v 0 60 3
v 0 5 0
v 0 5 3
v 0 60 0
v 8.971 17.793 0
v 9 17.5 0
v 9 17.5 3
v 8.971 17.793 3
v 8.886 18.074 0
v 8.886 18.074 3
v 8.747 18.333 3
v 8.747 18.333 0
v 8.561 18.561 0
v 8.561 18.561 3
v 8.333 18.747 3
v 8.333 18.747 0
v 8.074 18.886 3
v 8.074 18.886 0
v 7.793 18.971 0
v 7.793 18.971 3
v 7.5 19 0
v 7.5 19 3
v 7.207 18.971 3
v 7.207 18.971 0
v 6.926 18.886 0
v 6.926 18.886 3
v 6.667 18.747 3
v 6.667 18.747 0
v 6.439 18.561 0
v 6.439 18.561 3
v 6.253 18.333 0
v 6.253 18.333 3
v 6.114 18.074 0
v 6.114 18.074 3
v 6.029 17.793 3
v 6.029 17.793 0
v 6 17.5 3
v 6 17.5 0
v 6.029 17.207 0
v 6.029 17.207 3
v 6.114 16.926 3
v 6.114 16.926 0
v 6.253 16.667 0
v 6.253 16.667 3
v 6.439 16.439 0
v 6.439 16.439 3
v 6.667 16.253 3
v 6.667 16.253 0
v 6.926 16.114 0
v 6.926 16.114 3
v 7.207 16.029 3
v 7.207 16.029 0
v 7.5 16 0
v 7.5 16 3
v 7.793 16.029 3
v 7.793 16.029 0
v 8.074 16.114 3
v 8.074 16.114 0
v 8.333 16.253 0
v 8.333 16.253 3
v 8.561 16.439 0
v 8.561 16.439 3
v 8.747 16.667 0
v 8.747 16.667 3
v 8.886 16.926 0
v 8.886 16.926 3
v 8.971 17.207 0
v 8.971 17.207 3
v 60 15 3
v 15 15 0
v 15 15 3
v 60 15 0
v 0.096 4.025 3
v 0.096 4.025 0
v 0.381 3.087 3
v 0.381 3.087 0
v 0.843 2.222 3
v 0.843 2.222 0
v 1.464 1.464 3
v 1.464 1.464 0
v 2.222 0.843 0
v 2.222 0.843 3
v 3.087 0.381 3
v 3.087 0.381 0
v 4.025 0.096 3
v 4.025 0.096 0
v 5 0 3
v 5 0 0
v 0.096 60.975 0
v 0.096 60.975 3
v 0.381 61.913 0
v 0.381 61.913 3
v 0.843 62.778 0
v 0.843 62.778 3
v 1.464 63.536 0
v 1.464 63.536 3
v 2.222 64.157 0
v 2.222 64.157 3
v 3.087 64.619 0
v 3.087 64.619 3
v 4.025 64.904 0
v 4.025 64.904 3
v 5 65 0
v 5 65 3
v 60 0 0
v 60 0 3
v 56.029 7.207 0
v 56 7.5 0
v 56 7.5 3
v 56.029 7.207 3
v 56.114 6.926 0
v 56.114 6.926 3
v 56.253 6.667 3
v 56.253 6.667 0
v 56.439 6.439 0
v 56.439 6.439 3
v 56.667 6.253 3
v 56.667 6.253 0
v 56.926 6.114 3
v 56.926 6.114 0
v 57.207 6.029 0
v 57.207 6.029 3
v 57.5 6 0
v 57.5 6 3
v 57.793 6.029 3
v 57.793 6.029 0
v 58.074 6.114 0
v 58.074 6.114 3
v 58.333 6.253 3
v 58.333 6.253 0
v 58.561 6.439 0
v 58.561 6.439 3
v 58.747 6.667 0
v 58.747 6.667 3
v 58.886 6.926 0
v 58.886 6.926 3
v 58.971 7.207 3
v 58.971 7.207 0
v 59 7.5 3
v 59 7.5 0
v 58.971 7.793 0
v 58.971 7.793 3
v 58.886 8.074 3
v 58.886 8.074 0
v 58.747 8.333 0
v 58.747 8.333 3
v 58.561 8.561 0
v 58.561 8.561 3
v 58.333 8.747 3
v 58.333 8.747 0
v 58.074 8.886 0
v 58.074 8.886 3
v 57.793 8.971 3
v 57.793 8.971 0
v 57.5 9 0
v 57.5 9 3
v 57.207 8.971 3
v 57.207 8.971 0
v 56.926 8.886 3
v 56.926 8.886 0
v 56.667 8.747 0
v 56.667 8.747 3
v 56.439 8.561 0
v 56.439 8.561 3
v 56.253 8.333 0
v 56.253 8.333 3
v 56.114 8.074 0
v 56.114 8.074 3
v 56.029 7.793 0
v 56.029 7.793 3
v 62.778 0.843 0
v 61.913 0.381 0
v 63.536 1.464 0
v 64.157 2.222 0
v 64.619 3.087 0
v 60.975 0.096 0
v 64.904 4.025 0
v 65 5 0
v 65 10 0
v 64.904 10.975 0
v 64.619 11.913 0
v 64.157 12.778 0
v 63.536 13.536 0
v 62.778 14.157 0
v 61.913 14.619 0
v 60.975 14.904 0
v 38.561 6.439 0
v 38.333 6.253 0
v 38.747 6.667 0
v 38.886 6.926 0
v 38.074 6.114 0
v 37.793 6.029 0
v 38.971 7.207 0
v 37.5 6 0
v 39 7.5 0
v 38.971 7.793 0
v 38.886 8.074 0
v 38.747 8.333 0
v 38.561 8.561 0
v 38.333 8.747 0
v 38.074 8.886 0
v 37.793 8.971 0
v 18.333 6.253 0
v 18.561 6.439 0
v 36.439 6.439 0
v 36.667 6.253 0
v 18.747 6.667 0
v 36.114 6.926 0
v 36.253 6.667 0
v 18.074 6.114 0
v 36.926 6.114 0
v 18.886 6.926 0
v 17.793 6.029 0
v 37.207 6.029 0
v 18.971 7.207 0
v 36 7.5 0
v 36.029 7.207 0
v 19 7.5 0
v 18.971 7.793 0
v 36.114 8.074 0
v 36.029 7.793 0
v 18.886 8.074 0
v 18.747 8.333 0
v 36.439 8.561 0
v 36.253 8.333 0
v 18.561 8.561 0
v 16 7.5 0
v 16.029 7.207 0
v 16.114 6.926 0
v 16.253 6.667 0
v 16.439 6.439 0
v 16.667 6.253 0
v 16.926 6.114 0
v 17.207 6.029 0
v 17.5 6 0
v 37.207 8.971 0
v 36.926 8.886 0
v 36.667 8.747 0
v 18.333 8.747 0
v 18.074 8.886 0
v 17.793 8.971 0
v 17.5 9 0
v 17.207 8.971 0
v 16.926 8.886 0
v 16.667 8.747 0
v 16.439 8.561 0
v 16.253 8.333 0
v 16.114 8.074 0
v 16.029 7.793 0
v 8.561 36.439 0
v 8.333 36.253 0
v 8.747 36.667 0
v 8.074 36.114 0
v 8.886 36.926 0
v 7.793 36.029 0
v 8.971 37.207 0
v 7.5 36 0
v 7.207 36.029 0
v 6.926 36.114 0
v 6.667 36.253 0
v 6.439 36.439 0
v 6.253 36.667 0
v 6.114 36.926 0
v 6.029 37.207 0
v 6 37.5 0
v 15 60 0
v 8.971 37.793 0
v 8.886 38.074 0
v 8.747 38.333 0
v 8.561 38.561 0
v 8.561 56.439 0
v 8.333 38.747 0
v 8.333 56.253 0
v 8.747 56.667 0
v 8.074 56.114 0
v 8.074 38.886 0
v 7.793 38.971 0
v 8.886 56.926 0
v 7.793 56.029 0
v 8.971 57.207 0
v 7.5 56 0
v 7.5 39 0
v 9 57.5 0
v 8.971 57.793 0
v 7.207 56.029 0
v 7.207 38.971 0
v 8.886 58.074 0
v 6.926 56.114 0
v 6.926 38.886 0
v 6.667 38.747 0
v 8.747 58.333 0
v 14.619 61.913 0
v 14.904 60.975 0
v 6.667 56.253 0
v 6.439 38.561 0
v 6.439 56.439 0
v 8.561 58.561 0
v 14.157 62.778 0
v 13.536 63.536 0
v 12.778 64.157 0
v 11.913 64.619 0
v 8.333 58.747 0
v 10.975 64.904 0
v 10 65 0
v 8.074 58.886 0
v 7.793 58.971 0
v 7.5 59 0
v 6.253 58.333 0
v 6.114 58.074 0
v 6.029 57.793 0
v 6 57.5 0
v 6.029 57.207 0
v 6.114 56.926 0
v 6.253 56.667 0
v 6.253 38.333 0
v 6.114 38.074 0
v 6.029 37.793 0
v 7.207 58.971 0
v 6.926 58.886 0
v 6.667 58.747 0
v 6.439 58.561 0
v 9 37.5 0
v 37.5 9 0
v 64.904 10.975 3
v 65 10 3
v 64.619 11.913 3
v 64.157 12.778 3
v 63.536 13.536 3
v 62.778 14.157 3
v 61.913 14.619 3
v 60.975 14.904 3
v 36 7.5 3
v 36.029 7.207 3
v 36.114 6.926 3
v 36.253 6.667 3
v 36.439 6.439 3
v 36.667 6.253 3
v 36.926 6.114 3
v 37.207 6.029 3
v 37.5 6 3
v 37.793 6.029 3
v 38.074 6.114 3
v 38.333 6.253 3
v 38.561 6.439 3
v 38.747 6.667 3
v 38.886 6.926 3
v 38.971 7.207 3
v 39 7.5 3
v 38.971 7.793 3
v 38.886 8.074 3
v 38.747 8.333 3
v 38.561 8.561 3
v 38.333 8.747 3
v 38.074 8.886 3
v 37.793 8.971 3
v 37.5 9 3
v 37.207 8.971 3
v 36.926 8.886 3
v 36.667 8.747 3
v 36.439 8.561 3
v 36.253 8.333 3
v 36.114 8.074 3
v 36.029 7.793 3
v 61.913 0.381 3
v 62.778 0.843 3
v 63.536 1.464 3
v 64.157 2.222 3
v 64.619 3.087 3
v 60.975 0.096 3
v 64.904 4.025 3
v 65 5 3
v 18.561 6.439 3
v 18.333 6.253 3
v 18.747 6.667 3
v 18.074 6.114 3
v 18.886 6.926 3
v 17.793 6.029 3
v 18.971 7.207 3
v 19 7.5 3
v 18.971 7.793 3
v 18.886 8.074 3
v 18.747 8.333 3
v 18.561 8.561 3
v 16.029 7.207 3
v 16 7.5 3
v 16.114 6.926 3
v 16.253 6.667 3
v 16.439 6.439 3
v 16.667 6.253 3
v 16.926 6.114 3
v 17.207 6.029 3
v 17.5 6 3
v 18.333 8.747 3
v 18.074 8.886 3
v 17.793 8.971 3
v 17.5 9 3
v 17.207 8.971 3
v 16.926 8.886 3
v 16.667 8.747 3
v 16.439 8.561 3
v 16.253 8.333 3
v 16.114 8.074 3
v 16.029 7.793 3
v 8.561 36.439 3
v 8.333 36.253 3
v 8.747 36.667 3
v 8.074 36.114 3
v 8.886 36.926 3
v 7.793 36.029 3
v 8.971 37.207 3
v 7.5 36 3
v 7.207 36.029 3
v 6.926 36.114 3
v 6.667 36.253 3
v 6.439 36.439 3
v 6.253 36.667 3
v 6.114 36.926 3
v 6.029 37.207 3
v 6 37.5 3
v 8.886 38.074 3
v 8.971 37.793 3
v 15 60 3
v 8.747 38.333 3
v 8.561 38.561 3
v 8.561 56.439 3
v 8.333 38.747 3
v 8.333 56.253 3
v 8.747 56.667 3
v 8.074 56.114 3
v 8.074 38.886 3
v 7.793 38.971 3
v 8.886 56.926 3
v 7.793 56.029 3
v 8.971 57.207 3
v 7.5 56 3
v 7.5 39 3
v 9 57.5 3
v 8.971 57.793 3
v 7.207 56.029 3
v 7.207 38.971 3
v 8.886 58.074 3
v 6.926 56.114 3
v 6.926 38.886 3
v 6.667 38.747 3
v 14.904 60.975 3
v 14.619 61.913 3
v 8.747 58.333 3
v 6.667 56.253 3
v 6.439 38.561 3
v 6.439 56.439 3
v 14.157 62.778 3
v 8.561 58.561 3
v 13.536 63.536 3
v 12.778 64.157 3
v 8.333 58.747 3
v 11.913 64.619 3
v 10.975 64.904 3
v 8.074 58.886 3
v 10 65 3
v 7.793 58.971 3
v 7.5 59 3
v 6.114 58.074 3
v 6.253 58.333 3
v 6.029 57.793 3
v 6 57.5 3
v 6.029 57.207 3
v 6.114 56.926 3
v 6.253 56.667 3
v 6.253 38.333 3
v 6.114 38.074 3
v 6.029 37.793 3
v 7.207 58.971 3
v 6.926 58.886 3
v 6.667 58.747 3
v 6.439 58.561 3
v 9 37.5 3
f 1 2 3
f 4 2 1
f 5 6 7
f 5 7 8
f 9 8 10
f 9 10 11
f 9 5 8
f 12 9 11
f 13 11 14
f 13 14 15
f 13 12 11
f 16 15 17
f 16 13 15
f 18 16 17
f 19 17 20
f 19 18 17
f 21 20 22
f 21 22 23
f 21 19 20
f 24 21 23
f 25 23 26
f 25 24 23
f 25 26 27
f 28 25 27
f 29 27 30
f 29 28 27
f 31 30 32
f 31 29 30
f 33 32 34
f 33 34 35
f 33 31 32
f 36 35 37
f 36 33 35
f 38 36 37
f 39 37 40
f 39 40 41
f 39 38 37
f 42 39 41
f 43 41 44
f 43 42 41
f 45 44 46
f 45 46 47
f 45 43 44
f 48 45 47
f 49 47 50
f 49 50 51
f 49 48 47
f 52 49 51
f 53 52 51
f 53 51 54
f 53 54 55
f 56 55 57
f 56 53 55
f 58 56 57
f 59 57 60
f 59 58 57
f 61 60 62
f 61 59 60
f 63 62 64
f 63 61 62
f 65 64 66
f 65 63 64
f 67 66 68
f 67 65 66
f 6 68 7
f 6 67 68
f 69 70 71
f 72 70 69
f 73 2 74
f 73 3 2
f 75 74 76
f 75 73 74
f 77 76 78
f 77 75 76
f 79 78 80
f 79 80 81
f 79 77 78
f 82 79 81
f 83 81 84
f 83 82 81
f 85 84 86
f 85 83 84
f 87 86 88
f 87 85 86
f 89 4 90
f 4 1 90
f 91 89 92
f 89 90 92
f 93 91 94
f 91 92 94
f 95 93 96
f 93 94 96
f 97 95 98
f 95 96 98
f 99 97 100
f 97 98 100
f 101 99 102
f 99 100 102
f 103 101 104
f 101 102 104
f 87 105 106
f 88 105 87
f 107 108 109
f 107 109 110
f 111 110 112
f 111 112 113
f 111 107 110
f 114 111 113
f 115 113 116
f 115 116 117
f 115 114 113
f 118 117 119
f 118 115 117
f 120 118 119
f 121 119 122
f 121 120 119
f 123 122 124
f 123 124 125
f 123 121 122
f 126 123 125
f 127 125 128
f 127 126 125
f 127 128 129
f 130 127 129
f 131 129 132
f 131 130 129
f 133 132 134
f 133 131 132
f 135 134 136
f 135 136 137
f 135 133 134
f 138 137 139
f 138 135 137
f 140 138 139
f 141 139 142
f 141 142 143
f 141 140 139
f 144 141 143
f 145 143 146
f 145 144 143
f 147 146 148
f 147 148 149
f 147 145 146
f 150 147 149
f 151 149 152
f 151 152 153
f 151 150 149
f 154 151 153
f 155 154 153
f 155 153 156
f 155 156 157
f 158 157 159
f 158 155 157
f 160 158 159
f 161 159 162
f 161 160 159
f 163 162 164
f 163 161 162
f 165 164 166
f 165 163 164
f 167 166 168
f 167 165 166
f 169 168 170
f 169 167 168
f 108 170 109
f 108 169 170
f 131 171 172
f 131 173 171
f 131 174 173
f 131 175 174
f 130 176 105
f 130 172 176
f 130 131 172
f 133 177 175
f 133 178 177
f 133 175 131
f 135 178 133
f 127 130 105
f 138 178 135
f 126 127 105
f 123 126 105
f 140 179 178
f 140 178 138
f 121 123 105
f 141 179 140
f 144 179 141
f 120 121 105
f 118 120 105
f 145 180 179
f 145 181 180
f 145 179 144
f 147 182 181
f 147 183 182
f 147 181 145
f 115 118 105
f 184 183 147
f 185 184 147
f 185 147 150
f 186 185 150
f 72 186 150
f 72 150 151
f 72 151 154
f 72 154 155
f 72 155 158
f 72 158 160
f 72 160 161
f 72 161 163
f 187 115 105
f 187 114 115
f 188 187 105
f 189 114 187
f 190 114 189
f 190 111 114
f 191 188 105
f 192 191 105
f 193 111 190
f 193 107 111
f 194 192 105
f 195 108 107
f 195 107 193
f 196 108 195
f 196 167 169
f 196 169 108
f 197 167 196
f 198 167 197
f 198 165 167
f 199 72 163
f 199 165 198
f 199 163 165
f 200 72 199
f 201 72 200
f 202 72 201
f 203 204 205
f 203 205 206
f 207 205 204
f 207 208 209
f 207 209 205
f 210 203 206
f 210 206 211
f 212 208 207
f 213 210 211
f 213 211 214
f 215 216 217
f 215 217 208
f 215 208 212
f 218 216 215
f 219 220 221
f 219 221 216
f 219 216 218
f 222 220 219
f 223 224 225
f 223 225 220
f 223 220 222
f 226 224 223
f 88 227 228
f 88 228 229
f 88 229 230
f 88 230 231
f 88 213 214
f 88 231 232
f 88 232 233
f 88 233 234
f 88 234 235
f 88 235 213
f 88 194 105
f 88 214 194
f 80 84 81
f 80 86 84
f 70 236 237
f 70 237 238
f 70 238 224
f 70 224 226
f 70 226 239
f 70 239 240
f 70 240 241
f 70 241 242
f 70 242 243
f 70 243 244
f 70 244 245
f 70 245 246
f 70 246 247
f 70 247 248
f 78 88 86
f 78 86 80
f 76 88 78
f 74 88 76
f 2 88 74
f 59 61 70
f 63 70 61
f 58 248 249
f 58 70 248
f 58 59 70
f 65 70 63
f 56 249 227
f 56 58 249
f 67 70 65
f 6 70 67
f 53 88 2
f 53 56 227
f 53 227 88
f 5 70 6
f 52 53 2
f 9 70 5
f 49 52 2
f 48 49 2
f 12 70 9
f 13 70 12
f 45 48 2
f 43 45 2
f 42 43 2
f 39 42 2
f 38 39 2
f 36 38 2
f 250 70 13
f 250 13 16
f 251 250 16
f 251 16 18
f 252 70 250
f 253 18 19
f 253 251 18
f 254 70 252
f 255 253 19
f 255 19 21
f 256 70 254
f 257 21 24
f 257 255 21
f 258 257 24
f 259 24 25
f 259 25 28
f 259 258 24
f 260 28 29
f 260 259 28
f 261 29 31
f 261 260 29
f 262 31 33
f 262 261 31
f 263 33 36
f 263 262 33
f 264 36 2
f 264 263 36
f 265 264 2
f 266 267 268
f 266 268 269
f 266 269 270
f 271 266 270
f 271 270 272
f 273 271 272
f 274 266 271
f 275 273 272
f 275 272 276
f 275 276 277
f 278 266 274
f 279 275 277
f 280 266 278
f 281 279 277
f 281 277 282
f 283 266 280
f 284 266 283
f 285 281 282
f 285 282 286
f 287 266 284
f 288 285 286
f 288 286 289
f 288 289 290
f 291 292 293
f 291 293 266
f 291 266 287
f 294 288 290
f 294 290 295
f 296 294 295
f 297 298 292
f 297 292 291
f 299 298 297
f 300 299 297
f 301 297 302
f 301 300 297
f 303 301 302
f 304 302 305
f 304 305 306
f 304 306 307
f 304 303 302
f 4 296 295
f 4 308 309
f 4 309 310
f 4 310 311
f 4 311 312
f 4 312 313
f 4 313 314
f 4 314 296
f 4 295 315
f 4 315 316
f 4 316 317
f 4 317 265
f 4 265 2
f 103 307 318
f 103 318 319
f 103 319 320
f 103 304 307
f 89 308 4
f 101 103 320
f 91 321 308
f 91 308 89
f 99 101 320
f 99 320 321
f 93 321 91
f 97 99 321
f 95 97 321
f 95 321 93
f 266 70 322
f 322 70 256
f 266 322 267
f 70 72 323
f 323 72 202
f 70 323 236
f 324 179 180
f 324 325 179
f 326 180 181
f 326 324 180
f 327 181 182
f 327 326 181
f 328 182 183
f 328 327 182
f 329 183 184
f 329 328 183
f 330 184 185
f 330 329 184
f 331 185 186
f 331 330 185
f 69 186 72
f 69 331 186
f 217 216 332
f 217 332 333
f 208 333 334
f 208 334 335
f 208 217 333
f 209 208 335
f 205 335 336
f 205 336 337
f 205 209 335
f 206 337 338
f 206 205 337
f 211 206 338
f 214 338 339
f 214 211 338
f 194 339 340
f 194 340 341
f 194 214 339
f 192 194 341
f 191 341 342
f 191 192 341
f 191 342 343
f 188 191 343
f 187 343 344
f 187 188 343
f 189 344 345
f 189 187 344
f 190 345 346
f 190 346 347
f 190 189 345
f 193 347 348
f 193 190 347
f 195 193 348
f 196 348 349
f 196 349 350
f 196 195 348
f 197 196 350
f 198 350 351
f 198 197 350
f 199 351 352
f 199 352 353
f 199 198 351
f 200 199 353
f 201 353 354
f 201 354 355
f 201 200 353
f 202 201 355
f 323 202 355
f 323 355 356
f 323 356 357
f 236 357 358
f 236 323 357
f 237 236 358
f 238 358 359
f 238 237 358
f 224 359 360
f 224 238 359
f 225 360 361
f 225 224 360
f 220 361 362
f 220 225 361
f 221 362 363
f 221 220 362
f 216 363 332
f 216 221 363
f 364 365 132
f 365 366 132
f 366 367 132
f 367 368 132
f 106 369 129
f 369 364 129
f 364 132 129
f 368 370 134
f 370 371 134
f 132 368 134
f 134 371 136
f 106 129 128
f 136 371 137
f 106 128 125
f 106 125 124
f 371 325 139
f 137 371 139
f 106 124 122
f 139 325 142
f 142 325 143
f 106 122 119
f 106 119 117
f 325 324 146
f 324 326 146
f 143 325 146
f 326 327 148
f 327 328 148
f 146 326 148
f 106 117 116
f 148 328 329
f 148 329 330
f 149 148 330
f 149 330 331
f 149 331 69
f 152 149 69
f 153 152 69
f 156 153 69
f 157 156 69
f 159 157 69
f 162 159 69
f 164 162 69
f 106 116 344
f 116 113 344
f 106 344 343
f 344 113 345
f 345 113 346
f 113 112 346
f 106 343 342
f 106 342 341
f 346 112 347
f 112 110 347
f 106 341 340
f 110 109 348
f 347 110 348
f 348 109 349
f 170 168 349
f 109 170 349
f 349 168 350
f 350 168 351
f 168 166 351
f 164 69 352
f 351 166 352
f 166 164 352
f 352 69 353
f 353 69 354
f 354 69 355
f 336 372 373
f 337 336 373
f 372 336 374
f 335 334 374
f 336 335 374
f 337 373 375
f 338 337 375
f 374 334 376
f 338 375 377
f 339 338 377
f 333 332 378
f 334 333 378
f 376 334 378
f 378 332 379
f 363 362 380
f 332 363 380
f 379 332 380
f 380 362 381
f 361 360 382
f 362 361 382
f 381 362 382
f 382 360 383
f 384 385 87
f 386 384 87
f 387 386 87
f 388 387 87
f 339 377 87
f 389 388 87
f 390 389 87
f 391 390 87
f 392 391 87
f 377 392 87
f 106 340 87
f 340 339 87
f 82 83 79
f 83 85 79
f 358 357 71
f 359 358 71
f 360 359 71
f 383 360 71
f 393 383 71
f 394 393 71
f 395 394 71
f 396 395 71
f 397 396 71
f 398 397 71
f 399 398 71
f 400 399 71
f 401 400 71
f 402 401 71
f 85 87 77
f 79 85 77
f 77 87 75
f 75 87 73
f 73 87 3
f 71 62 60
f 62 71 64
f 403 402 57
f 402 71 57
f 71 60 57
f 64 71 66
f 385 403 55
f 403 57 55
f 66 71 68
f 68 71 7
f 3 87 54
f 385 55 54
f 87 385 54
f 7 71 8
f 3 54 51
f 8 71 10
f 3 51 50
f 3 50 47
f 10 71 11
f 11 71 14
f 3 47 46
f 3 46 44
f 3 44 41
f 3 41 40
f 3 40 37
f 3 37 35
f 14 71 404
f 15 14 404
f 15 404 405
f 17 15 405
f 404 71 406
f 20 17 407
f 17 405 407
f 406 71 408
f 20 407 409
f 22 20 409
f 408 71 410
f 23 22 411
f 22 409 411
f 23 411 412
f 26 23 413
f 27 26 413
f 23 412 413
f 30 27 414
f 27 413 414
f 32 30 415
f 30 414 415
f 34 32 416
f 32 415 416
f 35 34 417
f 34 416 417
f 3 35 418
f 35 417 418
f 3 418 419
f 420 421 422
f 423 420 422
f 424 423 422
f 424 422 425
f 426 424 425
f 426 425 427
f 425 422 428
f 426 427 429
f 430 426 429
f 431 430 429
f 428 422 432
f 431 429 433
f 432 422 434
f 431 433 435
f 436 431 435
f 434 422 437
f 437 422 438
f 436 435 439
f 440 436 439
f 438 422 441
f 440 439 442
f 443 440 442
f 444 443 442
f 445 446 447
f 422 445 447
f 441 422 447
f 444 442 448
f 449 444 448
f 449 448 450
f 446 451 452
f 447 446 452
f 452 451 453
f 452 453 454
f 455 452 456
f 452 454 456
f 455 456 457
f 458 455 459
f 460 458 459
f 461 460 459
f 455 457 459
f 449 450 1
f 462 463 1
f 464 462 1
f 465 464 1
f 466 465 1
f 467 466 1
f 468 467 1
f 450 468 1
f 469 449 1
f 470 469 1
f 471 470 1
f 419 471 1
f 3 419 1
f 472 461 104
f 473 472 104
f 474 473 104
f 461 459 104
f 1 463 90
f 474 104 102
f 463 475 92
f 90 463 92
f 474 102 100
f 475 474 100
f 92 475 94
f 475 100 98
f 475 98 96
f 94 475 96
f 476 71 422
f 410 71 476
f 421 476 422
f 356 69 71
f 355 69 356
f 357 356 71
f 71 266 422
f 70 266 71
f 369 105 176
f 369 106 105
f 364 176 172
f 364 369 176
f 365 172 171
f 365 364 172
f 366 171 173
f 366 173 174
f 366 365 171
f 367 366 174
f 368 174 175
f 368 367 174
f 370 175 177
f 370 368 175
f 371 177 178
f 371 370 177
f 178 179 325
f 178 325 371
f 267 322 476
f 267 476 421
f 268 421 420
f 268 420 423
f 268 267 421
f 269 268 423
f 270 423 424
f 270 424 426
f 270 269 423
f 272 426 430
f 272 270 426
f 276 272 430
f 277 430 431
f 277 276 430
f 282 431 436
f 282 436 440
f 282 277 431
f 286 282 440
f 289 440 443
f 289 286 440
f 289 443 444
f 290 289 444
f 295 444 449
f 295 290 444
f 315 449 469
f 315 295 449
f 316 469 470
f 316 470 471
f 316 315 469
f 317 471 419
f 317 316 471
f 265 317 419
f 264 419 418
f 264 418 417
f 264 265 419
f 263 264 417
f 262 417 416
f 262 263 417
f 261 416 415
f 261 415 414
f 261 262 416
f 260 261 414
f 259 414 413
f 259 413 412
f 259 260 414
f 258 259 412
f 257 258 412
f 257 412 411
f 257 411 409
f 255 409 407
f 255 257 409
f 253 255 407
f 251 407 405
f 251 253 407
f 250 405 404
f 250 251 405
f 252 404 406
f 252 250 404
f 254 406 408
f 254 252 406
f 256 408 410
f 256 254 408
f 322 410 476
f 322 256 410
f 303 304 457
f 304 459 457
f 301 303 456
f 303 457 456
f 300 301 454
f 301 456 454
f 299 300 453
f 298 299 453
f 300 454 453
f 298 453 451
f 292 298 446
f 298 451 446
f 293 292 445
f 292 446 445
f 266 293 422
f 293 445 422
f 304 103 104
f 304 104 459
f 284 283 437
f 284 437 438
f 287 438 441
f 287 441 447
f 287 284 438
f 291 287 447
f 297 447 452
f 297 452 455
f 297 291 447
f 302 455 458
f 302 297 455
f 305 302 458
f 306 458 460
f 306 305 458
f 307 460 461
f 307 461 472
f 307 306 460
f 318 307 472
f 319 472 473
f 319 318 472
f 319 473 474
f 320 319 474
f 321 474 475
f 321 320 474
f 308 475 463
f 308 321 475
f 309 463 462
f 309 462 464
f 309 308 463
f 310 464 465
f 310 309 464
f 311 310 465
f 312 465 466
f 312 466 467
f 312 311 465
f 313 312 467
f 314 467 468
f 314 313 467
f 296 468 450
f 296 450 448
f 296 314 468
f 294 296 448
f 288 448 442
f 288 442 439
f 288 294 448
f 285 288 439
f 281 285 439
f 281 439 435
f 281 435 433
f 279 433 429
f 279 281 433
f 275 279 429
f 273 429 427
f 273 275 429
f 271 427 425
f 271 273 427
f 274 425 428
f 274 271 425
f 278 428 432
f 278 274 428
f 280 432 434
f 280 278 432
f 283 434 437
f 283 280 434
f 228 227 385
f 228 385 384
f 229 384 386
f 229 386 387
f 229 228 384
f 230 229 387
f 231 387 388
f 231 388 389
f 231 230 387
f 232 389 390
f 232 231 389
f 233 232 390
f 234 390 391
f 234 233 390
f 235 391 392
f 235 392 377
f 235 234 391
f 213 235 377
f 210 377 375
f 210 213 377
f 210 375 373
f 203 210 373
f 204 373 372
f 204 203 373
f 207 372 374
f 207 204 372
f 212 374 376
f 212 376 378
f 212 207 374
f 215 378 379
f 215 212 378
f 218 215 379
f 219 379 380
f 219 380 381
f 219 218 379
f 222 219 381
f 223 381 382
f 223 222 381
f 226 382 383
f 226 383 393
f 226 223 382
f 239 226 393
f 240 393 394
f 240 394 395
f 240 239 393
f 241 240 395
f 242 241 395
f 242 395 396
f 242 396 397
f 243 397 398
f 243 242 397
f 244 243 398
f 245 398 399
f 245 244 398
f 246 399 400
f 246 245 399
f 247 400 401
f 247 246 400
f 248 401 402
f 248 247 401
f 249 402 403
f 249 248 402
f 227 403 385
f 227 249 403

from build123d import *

# Parameters (mm, degrees)
SKETCH_1_R      = 1.5
EXTRUDE_1_DEPTH = 3
FILLET_1_R      = 5


with BuildPart() as part:
    # 草图1 → 凸台-拉伸1 (new body)
    with BuildSketch(Plane.XY):
        Polygon((0, 0), (0, 65), (15, 65), (15, 15), (65, 15), (65, 0), align=None)
        with Locations((7.5, 57.5)):
            Circle(SKETCH_1_R, mode=Mode.SUBTRACT)
        with Locations((7.5, 37.5)):
            Circle(SKETCH_1_R, mode=Mode.SUBTRACT)
        with Locations((7.5, 17.5)):
            Circle(SKETCH_1_R, mode=Mode.SUBTRACT)
        with Locations(Location((57.5, 7.5, 0), (0, 0, 180))):
            Circle(SKETCH_1_R, mode=Mode.SUBTRACT)
        with Locations(Location((37.5, 7.5, 0), (0, 0, 180))):
            Circle(SKETCH_1_R, mode=Mode.SUBTRACT)
        with Locations(Location((17.5, 7.5, 0), (0, 0, 180))):
            Circle(SKETCH_1_R, mode=Mode.SUBTRACT)
    extrude(amount=EXTRUDE_1_DEPTH)

    # 圆角1
    fillet_1_edges = [part.edges().sort_by_distance(p)[0] for p in [
        (0, 0, 1.5),
        (0, 65, 1.5),
        (15, 65, 1.5),
        (65, 15, 1.5),
        (65, 0, 1.5),
    ]]
    fillet(fillet_1_edges, radius=FILLET_1_R)


solid = part.part
